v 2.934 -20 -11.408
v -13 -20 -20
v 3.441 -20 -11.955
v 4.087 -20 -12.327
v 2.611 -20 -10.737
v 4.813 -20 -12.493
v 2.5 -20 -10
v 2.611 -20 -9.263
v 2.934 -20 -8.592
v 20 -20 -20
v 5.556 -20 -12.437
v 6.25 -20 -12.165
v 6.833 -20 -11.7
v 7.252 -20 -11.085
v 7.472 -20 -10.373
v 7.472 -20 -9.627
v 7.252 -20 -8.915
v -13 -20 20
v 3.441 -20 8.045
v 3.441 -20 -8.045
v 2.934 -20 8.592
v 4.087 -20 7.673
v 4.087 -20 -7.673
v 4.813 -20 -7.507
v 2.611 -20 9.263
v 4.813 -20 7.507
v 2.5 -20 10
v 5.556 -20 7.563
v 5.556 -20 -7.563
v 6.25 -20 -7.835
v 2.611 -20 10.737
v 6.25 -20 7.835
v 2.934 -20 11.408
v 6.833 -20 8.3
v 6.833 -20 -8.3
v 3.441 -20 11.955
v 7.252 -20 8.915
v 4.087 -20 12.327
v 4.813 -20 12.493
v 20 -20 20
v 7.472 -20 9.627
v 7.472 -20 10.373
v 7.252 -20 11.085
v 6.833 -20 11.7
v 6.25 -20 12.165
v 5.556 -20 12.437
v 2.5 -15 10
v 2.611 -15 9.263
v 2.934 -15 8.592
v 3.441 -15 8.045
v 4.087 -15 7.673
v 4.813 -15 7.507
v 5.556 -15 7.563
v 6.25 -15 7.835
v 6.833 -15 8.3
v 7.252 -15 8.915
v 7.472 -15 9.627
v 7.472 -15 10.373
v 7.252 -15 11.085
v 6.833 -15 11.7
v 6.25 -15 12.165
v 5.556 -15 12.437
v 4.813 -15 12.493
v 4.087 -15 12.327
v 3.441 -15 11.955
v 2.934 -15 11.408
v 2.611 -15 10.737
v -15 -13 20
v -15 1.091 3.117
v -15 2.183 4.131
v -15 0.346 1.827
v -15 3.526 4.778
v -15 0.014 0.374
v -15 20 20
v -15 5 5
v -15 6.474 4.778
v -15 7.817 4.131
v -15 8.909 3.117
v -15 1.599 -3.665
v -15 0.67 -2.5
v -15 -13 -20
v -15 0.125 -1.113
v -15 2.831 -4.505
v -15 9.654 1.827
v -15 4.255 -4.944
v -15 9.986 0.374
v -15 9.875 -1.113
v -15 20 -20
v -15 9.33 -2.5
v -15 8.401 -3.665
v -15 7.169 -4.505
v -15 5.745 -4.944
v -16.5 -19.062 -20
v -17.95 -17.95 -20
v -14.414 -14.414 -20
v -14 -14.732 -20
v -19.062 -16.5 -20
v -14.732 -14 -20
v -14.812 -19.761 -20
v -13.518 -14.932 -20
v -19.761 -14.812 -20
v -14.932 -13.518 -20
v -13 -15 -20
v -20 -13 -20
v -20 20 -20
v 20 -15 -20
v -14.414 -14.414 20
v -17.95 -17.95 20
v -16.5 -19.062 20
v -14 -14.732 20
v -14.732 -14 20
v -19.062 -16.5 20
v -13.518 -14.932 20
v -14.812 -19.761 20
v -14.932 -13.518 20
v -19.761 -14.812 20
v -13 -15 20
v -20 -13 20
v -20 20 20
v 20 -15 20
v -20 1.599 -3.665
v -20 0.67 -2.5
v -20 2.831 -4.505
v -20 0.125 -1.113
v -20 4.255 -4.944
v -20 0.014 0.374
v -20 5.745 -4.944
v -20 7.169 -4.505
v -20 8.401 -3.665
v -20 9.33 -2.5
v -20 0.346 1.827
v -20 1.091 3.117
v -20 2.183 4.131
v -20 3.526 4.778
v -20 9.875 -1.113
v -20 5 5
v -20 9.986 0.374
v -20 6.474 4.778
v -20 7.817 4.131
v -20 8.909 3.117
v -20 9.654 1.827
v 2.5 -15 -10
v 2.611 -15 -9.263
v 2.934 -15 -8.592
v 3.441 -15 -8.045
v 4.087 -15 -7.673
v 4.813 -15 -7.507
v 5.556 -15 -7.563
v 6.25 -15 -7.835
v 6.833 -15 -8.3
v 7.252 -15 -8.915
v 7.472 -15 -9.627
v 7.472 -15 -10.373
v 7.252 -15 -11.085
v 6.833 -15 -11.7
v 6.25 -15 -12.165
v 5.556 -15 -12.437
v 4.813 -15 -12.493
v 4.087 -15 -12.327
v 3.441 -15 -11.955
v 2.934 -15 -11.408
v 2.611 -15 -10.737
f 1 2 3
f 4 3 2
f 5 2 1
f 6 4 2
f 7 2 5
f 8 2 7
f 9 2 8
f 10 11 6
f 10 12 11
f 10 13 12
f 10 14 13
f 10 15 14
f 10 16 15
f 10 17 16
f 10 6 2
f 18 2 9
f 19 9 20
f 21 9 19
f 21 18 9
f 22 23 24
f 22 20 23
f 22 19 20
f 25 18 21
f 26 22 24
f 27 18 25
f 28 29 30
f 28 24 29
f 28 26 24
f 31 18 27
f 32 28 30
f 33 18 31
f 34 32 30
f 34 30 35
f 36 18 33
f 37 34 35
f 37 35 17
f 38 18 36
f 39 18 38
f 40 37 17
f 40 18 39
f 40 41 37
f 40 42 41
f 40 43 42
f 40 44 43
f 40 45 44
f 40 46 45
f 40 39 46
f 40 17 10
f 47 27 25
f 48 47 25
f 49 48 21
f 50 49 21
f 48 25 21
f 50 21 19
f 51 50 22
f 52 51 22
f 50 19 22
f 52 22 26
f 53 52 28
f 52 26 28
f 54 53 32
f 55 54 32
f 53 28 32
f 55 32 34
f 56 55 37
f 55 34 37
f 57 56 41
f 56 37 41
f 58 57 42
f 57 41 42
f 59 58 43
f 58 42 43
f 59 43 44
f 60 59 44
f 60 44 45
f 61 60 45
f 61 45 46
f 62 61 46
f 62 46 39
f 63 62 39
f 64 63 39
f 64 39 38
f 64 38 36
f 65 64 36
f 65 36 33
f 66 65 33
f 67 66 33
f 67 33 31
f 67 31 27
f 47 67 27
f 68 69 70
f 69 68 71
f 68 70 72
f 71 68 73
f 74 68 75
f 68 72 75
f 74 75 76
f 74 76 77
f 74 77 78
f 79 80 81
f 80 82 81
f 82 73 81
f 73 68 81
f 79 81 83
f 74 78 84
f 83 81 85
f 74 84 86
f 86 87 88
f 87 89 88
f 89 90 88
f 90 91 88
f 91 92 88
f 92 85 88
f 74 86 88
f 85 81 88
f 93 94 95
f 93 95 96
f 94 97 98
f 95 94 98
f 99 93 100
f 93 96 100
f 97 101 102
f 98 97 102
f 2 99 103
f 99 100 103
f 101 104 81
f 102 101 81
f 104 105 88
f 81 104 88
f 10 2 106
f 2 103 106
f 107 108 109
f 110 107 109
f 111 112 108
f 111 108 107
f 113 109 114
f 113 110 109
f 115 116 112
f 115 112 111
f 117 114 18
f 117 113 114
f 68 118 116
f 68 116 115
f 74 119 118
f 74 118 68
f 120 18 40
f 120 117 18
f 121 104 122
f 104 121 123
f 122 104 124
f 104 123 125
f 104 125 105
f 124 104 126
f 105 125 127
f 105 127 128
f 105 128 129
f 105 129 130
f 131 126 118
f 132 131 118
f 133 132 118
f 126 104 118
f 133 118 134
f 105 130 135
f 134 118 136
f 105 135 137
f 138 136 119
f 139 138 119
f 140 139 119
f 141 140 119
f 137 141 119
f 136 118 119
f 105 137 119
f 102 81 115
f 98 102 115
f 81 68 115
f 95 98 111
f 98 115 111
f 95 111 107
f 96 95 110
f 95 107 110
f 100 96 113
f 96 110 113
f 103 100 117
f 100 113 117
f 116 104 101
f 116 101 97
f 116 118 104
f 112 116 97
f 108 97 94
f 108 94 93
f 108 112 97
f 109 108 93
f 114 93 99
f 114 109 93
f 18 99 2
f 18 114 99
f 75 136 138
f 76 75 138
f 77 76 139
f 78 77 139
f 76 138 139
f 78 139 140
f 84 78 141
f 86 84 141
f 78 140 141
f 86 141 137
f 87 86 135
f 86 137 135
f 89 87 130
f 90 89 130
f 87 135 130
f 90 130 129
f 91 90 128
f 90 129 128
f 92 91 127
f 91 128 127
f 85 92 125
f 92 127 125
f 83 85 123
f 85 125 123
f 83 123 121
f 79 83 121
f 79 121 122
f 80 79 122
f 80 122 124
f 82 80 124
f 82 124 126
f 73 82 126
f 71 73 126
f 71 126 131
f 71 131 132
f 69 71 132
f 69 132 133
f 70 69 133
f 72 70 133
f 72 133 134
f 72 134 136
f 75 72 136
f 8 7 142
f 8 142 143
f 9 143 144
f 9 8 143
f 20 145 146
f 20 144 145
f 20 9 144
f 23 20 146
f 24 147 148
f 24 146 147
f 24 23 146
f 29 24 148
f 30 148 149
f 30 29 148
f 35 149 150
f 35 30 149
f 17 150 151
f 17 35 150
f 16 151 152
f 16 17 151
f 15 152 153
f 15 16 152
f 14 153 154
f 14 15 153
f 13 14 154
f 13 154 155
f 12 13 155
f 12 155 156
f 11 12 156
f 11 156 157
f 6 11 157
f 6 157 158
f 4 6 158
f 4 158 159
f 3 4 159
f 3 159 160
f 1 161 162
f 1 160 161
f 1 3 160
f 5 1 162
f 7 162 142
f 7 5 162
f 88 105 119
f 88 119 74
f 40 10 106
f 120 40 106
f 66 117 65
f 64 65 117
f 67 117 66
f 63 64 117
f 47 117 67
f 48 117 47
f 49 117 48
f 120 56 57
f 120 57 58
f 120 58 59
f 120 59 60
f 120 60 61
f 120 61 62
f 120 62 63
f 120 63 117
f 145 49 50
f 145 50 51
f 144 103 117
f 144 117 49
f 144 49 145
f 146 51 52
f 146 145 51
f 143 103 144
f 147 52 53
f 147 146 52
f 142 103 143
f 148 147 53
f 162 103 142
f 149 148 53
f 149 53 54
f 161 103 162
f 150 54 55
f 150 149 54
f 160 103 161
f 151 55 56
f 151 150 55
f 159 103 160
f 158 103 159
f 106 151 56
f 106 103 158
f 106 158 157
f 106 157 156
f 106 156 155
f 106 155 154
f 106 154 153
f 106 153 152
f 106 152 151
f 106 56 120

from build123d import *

# Parameters (mm, degrees)
SKETCH1_W               = 40
SKETCH1_H               = 40
BOSS_EXTRUDE1_DEPTH     = 20
CUT_EXTRUDE1_DEPTH      = 49.989794856
CUT_EXTRUDE1_DEPTH_BACK = 49.989794856
SKETCH2_W               = 35
SKETCH2_H               = 35
FILLET1_R               = 2
FILLET2_R               = 7
HOLE1_D                 = 10
HOLE3_D                 = 5


with BuildPart() as part:
    # Sketch1 → Boss-Extrude1 (new, symmetric)
    with BuildSketch(Plane.XY):
        Rectangle(SKETCH1_W, SKETCH1_H)
    extrude(amount=BOSS_EXTRUDE1_DEPTH, both=True)

    # Sketch2 → Cut-Extrude1 (cut, two sides: drawn at the far end of the back side and taken through both)
    with BuildSketch(Plane.XY.offset(20).offset(-CUT_EXTRUDE1_DEPTH_BACK)):
        with Locations((2.5, 2.5)):
            Rectangle(SKETCH2_W, SKETCH2_H)
    extrude(amount=CUT_EXTRUDE1_DEPTH + CUT_EXTRUDE1_DEPTH_BACK, mode=Mode.SUBTRACT)

    # Fillet1
    fillet1_edges = [part.edges().sort_by_distance(p)[0] for p in [
        (-15, -15, 0),
    ]]
    fillet(fillet1_edges, radius=FILLET1_R)

    # Fillet2
    fillet2_edges = [part.edges().sort_by_distance(p)[0] for p in [
        (-20, -20, 0),
    ]]
    fillet(fillet2_edges, radius=FILLET2_R)

    # Hole1 (through all)
    with Locations(Plane(origin=(-15, 0, 0), x_dir=(0, 0, -1), z_dir=(1, 0, 0))):
        with Locations((0, 5)):
            Hole(HOLE1_D / 2)

    # Hole3 (through all)
    with Locations(Plane(origin=(0, -15, 0), x_dir=(1, 0, 0), z_dir=(0, 1, 0))):
        with Locations((5, -10)):
            hole3 = Hole(HOLE3_D / 2)

    # Mirror1: Hole3 across plane
    add(hole3.mirror(Plane.XY), mode=Mode.SUBTRACT)


solid = part.part
